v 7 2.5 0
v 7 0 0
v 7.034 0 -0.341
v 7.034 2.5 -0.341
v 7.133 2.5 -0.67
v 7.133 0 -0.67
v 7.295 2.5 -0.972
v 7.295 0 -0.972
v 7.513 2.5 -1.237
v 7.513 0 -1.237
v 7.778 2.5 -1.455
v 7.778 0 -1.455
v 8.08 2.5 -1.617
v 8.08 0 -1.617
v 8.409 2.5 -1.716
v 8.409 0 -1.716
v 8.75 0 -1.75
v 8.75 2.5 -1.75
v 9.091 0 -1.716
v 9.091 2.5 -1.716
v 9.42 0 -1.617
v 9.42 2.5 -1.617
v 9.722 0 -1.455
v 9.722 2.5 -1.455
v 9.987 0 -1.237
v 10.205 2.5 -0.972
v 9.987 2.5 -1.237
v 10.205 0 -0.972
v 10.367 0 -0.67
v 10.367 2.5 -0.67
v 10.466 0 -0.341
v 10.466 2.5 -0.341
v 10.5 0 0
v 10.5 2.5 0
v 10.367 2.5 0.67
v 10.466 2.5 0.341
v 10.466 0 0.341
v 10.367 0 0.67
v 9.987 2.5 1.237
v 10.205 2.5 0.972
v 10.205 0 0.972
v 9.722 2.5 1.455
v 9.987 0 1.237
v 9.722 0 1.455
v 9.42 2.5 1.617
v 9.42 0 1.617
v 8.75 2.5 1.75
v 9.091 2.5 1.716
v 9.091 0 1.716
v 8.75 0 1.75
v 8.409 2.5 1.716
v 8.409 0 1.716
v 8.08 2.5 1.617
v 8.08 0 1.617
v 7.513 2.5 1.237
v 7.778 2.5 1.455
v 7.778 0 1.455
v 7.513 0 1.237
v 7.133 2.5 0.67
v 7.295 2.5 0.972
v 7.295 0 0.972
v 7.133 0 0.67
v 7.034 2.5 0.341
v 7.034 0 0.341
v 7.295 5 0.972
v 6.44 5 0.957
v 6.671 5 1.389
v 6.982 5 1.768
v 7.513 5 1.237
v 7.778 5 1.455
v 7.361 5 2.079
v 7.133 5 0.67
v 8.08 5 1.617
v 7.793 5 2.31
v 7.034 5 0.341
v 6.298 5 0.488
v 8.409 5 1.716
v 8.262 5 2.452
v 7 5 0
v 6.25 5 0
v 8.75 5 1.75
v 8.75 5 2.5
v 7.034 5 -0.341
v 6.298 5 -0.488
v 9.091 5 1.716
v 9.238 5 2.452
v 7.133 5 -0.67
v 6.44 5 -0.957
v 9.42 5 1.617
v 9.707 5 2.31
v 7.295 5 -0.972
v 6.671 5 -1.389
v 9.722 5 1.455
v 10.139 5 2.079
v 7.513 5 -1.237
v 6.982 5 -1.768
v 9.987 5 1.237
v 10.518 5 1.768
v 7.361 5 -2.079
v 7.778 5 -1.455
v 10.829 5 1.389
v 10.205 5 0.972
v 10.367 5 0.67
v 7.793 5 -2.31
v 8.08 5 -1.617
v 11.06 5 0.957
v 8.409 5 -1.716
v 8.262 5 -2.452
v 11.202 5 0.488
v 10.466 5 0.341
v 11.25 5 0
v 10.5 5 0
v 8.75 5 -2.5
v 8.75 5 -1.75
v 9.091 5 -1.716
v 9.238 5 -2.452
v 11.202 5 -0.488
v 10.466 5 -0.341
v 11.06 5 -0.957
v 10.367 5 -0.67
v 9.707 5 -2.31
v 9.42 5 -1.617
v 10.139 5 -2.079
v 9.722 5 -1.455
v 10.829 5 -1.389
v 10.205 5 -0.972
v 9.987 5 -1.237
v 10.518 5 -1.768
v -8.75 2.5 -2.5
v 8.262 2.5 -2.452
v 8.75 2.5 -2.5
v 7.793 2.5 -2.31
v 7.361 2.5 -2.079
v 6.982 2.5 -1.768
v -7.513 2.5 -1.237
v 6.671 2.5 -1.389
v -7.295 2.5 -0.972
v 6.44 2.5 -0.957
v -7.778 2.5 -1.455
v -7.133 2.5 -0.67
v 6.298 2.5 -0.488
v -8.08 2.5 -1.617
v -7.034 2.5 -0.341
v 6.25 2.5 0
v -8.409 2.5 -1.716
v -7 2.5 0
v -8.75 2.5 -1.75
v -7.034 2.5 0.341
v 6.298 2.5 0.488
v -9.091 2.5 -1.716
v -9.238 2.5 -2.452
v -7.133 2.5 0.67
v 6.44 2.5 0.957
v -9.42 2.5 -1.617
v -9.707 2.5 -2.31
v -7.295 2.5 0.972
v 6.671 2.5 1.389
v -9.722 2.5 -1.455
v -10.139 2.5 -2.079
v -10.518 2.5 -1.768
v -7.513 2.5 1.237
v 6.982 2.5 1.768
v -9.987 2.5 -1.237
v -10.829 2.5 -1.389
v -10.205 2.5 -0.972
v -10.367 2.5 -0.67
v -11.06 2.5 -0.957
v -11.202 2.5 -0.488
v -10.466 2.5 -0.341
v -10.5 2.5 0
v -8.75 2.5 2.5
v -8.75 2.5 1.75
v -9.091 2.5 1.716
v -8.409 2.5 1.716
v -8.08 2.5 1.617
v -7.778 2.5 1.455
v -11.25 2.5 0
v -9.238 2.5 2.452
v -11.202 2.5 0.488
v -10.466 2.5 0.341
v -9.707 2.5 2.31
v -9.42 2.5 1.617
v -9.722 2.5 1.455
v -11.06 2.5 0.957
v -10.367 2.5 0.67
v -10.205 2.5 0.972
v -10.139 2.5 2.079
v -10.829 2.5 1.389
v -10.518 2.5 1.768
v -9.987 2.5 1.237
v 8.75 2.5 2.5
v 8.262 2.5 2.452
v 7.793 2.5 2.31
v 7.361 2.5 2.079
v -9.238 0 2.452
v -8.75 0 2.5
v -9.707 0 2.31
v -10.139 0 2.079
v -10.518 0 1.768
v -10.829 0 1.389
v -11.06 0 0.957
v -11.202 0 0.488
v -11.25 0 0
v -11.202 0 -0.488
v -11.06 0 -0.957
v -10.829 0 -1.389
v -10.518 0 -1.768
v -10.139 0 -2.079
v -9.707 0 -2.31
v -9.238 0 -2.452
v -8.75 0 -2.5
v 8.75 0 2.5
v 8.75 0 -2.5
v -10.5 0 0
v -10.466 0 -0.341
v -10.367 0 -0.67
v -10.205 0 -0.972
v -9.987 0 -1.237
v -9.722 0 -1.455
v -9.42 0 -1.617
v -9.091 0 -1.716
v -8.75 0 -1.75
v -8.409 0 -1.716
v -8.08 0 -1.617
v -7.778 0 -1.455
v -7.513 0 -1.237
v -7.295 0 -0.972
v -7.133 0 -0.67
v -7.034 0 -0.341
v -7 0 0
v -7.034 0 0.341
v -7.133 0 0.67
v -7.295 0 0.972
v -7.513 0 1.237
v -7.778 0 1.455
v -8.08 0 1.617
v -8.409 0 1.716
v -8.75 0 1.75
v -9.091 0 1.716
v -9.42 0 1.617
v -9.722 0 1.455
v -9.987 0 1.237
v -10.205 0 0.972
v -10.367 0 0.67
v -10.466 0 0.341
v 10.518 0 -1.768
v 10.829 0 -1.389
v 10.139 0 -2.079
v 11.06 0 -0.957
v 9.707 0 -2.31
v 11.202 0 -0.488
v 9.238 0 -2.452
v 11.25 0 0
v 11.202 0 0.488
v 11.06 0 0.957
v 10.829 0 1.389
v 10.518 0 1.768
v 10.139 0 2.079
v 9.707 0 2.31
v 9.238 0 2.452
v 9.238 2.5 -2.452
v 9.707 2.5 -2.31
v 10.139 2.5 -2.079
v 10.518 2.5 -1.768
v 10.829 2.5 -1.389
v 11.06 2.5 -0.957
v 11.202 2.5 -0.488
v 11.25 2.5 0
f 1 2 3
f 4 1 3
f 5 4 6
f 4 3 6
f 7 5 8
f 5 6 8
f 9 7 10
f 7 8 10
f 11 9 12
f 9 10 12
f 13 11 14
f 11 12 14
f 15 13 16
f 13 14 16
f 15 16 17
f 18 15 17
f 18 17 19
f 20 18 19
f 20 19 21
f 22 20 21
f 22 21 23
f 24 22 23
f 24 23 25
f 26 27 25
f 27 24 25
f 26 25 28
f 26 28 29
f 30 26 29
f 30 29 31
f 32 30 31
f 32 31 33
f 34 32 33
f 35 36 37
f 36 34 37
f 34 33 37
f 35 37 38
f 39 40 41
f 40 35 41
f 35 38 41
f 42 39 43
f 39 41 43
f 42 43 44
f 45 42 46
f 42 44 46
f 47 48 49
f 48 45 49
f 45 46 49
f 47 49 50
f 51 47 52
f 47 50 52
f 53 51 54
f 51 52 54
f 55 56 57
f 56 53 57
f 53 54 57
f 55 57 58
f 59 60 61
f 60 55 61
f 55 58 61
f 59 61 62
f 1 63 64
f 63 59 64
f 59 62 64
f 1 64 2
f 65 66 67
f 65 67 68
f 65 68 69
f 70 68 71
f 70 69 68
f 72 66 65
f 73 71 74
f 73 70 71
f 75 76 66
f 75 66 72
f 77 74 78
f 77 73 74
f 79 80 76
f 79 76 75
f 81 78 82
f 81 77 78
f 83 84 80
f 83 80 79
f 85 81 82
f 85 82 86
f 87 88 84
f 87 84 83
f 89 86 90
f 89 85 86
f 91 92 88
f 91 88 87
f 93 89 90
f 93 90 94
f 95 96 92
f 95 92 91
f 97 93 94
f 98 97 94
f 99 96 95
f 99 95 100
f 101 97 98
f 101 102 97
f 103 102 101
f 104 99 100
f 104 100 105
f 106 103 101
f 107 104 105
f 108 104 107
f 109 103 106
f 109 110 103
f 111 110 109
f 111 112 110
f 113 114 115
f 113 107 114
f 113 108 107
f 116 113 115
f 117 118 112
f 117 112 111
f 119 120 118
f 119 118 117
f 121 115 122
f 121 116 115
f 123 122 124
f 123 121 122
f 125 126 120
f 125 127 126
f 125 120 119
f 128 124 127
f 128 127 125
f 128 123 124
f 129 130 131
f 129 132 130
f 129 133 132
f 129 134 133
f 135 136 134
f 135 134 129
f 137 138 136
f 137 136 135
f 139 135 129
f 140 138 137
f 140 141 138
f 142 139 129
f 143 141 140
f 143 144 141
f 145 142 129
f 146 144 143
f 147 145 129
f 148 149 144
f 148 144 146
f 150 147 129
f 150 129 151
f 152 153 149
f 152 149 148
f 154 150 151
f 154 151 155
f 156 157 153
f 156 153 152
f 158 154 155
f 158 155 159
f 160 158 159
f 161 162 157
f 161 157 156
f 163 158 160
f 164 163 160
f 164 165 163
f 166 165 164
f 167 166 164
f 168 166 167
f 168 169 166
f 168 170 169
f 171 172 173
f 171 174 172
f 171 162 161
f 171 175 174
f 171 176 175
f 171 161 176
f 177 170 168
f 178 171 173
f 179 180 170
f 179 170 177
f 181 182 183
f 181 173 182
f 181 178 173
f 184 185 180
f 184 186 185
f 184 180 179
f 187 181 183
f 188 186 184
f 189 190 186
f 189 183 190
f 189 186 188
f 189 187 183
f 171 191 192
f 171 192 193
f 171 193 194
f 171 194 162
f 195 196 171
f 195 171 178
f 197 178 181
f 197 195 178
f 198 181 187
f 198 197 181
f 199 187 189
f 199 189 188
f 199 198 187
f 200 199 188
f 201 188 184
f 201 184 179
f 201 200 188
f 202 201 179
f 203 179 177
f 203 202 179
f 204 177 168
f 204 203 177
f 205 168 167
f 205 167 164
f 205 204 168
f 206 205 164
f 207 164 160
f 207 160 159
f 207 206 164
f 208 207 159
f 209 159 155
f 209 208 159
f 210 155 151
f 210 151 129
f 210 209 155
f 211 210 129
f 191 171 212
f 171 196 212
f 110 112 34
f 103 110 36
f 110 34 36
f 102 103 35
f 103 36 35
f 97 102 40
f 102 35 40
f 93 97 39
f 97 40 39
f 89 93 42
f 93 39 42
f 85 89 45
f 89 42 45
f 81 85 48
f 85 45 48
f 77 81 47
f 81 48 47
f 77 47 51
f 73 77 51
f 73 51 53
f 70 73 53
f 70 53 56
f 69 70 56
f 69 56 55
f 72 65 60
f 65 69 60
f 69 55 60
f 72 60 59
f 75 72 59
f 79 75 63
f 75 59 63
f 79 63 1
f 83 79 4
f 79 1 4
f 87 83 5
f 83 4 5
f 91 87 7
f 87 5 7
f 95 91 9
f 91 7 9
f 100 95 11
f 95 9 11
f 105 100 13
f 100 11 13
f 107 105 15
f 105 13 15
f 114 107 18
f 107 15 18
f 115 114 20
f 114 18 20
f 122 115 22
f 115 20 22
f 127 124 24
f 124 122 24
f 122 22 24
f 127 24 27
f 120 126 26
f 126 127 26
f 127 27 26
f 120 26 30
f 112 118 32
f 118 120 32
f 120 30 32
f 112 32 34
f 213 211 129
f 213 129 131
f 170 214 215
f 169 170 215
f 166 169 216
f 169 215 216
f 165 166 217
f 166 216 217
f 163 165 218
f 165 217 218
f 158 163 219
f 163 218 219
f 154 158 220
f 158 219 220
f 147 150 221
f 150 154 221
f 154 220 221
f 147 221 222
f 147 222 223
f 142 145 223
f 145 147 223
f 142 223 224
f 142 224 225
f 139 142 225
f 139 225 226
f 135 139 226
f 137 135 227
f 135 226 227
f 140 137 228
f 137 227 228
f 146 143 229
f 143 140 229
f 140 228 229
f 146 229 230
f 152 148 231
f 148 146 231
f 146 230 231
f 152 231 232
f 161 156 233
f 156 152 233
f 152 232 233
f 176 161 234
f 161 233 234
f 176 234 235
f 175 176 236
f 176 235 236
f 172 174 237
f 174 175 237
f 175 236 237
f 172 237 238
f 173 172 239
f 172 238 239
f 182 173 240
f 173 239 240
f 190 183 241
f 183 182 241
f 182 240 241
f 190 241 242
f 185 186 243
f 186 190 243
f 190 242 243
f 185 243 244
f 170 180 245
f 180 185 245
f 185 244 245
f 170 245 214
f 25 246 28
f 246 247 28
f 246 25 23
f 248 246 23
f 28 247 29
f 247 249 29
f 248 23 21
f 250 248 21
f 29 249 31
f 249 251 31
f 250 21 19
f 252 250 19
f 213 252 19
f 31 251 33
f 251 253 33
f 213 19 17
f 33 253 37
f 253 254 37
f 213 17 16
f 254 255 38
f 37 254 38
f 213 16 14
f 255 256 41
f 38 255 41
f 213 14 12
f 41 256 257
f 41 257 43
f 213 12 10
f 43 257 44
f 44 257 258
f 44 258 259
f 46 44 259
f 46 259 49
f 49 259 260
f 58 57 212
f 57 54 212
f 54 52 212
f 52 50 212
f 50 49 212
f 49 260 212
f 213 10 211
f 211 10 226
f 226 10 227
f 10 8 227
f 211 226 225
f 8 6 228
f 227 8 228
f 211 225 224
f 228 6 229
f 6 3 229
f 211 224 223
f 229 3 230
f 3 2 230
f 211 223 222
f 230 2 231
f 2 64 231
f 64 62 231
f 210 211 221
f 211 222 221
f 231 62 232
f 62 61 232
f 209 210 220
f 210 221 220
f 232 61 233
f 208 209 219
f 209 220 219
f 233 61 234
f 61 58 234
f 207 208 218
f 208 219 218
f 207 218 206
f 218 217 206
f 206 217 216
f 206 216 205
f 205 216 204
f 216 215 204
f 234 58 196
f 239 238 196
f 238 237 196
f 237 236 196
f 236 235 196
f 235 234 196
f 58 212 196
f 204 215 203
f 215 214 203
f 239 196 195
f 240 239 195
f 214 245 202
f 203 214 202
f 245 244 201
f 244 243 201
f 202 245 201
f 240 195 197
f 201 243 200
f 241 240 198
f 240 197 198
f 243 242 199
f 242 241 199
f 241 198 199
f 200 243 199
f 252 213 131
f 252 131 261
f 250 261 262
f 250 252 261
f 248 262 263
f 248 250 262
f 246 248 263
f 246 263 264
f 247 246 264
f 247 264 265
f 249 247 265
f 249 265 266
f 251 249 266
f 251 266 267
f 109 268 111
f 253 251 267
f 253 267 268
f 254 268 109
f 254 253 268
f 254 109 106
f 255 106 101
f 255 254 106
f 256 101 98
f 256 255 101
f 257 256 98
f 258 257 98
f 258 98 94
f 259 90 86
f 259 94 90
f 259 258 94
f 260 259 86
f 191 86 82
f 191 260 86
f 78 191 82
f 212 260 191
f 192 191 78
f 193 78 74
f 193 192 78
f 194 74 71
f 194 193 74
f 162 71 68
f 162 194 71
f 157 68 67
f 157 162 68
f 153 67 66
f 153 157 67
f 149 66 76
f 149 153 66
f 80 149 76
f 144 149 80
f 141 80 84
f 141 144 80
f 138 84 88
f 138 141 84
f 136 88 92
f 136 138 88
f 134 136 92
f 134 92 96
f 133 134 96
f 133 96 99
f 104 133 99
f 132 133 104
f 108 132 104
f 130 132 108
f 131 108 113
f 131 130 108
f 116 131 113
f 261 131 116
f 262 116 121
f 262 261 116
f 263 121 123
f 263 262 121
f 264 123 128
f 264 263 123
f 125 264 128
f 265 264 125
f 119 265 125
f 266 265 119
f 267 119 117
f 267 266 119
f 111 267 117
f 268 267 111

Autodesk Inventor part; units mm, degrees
ref_plane "YZ Plane" through (0, 0, 0) normal (1, 0, 0) x (0, 1, 0)
ref_plane "XZ Plane" through (0, 0, 0) normal (0, 1, 0) x (-1, 0, 0)
ref_plane "XY Plane" through (0, 0, 0) normal (0, 0, 1) x (1, 0, 0)
sketch "Sketch1" plane through (0, 0, 0) normal (0, 1, 0) x (-1, 0, 0)
  line L0 (0, 0) -> (8.75, 0) construction
  circle A0 centre (8.75, 0) radius 1.75
  circle A1 centre (8.75, 0) radius 2.5
  line L1 (0, 0) -> (-8.75, 0) construction
  circle A2 centre (-8.75, 0) radius 1.75
  circle A3 centre (-8.75, 0) radius 2.5
  line L2 (8.75, 2.5) -> (-8.75, 2.5)
  line L3 (8.75, -2.5) -> (-8.75, -2.5)
  dimension "d0" = 8.75
  dimension "d1" = 3.5
  dimension "d2" = 5
  dimension "d3" = 8.75
  dimension "d4" = 3.5
  dimension "d5" = 5
extrude "Extrusion1" add sketch "Sketch1" along normal blind 2.5
sketch "Sketch2" plane through (0, 2.5, 0) normal (0, 1, 0) x (1, 0, 0)
  circle A0 centre (8.75, 0) radius 1.75 projected
  circle A1 centre (8.75, 0) radius 2.5
  point P0 (0, 0)
  dimension "d8" = 5
extrude "Extrusion2" add sketch "Sketch2" along normal blind 2.5
properties part number "eje de servo 2"
